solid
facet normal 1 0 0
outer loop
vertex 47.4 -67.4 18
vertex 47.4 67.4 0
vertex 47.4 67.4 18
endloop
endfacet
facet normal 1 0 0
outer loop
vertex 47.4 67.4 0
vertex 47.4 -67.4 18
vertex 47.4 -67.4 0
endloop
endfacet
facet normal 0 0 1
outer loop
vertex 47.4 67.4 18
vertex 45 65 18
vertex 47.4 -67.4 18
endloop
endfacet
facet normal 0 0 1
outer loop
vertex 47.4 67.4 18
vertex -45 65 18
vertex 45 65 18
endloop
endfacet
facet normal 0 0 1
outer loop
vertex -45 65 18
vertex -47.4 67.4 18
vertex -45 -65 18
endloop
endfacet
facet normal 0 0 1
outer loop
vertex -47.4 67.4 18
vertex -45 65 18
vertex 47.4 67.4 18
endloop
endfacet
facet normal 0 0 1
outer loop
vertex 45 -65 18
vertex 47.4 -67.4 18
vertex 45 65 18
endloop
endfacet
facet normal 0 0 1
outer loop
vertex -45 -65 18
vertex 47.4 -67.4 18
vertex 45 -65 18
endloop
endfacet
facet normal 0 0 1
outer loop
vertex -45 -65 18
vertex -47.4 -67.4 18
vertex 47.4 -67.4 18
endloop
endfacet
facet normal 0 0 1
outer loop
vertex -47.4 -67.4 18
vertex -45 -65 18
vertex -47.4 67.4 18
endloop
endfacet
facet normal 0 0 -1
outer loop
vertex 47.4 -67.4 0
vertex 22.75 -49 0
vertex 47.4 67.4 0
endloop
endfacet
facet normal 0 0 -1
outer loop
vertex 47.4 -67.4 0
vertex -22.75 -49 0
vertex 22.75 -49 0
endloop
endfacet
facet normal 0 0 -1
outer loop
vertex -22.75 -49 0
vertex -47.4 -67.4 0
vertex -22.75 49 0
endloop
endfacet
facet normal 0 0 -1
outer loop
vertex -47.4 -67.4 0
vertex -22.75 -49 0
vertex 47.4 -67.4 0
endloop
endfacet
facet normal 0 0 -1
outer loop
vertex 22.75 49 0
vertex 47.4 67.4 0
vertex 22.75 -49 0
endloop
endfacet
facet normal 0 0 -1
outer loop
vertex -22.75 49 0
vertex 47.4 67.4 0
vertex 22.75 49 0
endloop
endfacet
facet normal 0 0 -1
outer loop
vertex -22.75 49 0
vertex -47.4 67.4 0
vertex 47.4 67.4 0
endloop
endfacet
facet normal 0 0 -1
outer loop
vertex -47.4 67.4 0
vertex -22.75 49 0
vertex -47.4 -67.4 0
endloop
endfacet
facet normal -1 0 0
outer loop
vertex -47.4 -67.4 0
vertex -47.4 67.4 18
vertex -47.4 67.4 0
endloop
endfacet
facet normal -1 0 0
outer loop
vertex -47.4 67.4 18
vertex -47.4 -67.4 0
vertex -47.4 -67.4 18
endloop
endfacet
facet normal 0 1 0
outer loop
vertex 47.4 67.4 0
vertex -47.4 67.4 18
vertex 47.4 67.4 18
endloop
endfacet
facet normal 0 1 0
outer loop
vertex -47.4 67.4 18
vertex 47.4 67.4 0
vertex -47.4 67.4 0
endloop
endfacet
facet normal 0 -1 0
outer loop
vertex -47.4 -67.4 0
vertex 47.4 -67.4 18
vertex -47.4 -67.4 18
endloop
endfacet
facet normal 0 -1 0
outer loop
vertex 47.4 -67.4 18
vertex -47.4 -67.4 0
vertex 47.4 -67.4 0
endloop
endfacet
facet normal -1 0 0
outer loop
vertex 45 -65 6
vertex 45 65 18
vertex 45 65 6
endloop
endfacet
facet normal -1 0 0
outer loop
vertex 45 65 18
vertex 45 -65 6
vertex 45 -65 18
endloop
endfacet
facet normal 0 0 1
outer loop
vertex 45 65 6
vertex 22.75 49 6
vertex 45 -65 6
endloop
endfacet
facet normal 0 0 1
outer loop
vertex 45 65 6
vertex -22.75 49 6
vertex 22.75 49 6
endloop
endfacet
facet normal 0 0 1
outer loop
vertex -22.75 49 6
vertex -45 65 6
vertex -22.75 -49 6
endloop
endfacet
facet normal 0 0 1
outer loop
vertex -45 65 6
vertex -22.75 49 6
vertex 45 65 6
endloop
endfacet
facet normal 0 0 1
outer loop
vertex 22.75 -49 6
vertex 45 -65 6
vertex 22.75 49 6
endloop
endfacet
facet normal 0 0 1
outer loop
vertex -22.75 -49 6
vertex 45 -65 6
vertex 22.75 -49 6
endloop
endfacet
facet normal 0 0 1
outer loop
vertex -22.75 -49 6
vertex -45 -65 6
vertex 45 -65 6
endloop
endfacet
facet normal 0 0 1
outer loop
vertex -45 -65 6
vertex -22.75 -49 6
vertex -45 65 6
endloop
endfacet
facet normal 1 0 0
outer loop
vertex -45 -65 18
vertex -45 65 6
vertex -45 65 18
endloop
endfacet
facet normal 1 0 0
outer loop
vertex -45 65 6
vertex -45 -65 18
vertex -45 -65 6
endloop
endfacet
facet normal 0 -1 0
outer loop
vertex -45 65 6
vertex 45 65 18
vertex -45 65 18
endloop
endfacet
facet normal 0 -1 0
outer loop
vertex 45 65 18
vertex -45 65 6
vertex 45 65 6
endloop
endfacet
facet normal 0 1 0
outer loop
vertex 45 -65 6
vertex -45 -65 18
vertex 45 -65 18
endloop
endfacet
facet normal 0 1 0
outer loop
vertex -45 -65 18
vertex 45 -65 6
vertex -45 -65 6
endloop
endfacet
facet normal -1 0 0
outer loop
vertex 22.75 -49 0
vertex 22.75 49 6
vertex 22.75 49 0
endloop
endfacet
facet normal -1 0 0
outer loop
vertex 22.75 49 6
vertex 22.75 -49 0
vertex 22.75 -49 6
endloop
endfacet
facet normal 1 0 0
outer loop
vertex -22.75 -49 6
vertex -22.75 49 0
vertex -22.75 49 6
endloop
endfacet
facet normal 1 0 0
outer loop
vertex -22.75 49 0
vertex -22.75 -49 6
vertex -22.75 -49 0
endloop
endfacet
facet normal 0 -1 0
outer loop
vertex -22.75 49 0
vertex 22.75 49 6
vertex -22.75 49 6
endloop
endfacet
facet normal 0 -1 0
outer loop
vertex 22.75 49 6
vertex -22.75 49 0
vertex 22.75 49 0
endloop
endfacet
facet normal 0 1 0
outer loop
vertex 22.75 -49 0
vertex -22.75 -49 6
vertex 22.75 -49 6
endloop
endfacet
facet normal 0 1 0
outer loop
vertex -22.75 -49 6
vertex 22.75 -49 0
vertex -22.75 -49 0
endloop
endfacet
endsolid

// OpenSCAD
EPS=0.01;

OverallHeight=18;
PlateHeight=6;

// Messwerte Aussen
AussenWidth=90;
AussenDepth=130;

// Messwerte Innen
InnenWidth=45.5;
InnenDepth=98;

// Wandstärke Rand
E=2.4;


difference() {
  translate([0,0,OverallHeight/2])
    cube(size=[AussenWidth+E*2,AussenDepth+E*2,OverallHeight], center=true);

  translate([0,0,OverallHeight/2+PlateHeight])
    cube(size=[AussenWidth,AussenDepth,OverallHeight], center=true);

  translate([0,0,OverallHeight/2-EPS])
    cube(size=[InnenWidth,InnenDepth,OverallHeight], center=true);
}
